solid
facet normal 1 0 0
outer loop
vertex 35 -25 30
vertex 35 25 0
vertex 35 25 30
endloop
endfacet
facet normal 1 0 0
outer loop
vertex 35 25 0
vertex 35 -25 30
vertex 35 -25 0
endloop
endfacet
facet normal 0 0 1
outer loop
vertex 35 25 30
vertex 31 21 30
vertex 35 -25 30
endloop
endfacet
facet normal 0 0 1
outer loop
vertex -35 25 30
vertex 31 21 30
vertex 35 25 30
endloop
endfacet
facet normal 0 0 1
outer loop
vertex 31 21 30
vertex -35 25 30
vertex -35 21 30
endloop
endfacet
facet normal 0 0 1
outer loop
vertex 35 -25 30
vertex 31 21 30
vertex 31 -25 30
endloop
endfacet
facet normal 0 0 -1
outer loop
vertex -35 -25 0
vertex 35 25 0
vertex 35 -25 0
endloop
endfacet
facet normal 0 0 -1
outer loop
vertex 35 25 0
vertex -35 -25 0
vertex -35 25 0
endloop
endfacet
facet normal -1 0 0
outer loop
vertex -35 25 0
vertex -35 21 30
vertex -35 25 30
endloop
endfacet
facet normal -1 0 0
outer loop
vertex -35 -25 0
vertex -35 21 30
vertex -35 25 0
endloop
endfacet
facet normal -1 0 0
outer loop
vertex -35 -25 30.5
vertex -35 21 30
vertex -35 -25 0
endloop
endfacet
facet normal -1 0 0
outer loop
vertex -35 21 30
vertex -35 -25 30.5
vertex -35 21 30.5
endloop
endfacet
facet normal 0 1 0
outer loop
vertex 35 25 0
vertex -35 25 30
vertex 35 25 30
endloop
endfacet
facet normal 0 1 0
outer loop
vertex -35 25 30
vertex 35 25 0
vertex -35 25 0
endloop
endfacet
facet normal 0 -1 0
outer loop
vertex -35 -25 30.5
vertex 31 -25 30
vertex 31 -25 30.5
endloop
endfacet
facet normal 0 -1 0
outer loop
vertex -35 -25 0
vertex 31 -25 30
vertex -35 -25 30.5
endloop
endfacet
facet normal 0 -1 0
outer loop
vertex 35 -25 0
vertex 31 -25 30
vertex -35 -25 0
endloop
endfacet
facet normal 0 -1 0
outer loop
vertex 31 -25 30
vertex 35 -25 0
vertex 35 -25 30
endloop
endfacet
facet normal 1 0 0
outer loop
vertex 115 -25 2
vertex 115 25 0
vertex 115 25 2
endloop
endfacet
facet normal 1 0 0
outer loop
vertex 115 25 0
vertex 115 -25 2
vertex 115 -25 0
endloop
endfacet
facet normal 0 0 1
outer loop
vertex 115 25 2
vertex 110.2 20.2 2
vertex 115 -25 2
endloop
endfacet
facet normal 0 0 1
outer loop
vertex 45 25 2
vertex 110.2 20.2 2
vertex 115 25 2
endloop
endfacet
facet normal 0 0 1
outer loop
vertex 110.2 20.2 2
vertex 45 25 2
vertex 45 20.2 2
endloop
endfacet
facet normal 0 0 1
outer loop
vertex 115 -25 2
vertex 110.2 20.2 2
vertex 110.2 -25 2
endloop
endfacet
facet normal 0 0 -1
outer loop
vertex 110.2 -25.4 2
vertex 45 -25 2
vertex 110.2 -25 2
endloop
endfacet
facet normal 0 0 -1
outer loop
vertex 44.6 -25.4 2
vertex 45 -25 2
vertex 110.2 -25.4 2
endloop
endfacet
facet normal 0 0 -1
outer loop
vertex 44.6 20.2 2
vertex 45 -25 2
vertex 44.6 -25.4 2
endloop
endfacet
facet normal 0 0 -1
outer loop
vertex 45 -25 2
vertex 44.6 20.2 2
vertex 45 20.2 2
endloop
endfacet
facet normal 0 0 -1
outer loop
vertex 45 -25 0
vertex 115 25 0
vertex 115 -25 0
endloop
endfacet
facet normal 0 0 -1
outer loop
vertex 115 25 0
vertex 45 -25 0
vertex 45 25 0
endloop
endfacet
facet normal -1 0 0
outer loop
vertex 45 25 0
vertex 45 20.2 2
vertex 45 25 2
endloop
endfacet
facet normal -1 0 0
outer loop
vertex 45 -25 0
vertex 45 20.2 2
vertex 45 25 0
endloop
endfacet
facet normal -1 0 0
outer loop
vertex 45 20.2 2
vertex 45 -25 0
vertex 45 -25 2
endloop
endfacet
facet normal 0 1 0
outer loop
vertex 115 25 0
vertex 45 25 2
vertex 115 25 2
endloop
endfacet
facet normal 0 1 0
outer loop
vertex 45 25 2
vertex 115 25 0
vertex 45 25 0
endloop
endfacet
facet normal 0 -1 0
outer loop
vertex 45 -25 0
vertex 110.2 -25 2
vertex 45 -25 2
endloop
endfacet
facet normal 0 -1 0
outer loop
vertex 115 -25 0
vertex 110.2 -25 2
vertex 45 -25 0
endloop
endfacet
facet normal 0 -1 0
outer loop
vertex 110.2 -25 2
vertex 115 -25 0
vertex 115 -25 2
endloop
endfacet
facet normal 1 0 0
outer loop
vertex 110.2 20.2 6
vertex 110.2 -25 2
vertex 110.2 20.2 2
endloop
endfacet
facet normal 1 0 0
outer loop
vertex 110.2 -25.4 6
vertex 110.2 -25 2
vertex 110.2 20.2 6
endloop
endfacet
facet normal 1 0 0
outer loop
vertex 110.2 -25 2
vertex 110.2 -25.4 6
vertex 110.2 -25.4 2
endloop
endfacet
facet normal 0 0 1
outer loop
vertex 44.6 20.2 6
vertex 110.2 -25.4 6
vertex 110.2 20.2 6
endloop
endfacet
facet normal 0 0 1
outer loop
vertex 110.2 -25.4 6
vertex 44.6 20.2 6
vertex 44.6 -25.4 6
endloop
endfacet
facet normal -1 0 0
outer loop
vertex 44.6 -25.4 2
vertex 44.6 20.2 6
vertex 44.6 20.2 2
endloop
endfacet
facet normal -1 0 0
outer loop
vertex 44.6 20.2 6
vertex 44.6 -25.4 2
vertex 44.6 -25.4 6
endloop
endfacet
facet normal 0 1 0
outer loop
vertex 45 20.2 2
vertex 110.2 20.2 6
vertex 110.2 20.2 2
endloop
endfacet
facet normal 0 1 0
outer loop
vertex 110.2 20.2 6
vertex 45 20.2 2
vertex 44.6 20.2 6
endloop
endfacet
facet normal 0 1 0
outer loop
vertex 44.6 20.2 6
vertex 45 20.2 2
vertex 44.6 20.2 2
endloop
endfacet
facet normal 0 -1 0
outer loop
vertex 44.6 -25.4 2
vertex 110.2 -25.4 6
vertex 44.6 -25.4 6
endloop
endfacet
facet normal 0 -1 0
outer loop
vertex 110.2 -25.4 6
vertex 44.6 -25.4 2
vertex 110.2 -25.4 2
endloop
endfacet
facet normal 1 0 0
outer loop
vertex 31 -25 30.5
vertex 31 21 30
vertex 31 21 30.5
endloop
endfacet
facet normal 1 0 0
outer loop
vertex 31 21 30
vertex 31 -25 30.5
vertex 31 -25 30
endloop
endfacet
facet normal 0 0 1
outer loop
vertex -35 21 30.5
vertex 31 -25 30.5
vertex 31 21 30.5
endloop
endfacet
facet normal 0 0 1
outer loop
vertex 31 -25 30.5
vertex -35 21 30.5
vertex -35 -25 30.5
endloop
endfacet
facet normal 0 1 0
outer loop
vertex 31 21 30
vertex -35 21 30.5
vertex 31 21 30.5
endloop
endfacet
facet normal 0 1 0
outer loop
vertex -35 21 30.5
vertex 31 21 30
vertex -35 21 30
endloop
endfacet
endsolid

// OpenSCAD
// Two-part enclosure for a small electronics board (e.g. Arduino-based temperature logger)
// Print orientation: both parts rest on the bed (z = 0), side by side, with a 10 mm gap.
// Part 1 (box) is printed upright (open top). Part 2 (lid) is printed upside down
// as a flat plate with a lip that slides into the box opening.

// ---------------- Parameters ----------------
box_x      = 70;    // box outer length (X)
box_y      = 50;    // box outer width (Y)
box_z      = 30;    // box height (Z)
box_wall   = 2;     // box wall thickness
box_floor  = 2;     // box floor thickness

lip_t      = 1.5;   // lip wall thickness
lip_h      = 4;     // lip height (from plate top)
lip_x      = 65.6;  // lip outer length (X)
lip_y      = 45.6;  // lip outer width (Y)
lip_clear  = 0.2;   // clearance between lip and box opening (each side)

plate_t    = 2;     // plate thickness
gap        = 10;    // gap between box and lid on the bed
eps        = 0.5;   // cutter overshoot past faces

$fn = 64;

// Derived
box_i_x = box_x - 2 * box_wall;   // box opening length
box_i_y = box_y - 2 * box_wall;   // box opening width
lip_x0  = (lip_x - box_i_x - 2 * lip_clear) / 2;  // lip X offset from plate edge
lip_y0  = (lip_y - box_i_y - 2 * lip_clear) / 2;  // lip Y offset from plate edge

// ---------------- Model ----------------
union() {
    // Part 1: box, upright
    translate([-box_x / 2, -box_y / 2, 0])
        cube([box_x, box_y, box_z]);

    // Part 2: lid, printed upside down
    translate([box_x / 2 + gap, -box_y / 2, 0])
        cube([box_x, box_y, plate_t]);

    // Lip on top of the plate (overhangs the plate top; prints upside down)
    translate([box_x / 2 + gap + lip_x0, -box_y / 2 + lip_y0, plate_t])
        cube([lip_x, lip_y, lip_h]);
}

// ---------------- Cutters ----------------
difference() {
    // Box: remove the open-top cavity
    translate([-box_x / 2, -box_y / 2, box_floor])
        cube([box_i_x, box_i_y, box_z - box_floor + eps]);

    // Lip: sink the lip wall into the plate (through the plate and a bit into the bed)
    translate([box_x / 2 + gap + lip_x0, -box_y / 2 + lip_y0, plate_t])
        cube([lip_x - 2 * eps, lip_y - 2 * eps, lip_h + plate_t + eps]);
}
